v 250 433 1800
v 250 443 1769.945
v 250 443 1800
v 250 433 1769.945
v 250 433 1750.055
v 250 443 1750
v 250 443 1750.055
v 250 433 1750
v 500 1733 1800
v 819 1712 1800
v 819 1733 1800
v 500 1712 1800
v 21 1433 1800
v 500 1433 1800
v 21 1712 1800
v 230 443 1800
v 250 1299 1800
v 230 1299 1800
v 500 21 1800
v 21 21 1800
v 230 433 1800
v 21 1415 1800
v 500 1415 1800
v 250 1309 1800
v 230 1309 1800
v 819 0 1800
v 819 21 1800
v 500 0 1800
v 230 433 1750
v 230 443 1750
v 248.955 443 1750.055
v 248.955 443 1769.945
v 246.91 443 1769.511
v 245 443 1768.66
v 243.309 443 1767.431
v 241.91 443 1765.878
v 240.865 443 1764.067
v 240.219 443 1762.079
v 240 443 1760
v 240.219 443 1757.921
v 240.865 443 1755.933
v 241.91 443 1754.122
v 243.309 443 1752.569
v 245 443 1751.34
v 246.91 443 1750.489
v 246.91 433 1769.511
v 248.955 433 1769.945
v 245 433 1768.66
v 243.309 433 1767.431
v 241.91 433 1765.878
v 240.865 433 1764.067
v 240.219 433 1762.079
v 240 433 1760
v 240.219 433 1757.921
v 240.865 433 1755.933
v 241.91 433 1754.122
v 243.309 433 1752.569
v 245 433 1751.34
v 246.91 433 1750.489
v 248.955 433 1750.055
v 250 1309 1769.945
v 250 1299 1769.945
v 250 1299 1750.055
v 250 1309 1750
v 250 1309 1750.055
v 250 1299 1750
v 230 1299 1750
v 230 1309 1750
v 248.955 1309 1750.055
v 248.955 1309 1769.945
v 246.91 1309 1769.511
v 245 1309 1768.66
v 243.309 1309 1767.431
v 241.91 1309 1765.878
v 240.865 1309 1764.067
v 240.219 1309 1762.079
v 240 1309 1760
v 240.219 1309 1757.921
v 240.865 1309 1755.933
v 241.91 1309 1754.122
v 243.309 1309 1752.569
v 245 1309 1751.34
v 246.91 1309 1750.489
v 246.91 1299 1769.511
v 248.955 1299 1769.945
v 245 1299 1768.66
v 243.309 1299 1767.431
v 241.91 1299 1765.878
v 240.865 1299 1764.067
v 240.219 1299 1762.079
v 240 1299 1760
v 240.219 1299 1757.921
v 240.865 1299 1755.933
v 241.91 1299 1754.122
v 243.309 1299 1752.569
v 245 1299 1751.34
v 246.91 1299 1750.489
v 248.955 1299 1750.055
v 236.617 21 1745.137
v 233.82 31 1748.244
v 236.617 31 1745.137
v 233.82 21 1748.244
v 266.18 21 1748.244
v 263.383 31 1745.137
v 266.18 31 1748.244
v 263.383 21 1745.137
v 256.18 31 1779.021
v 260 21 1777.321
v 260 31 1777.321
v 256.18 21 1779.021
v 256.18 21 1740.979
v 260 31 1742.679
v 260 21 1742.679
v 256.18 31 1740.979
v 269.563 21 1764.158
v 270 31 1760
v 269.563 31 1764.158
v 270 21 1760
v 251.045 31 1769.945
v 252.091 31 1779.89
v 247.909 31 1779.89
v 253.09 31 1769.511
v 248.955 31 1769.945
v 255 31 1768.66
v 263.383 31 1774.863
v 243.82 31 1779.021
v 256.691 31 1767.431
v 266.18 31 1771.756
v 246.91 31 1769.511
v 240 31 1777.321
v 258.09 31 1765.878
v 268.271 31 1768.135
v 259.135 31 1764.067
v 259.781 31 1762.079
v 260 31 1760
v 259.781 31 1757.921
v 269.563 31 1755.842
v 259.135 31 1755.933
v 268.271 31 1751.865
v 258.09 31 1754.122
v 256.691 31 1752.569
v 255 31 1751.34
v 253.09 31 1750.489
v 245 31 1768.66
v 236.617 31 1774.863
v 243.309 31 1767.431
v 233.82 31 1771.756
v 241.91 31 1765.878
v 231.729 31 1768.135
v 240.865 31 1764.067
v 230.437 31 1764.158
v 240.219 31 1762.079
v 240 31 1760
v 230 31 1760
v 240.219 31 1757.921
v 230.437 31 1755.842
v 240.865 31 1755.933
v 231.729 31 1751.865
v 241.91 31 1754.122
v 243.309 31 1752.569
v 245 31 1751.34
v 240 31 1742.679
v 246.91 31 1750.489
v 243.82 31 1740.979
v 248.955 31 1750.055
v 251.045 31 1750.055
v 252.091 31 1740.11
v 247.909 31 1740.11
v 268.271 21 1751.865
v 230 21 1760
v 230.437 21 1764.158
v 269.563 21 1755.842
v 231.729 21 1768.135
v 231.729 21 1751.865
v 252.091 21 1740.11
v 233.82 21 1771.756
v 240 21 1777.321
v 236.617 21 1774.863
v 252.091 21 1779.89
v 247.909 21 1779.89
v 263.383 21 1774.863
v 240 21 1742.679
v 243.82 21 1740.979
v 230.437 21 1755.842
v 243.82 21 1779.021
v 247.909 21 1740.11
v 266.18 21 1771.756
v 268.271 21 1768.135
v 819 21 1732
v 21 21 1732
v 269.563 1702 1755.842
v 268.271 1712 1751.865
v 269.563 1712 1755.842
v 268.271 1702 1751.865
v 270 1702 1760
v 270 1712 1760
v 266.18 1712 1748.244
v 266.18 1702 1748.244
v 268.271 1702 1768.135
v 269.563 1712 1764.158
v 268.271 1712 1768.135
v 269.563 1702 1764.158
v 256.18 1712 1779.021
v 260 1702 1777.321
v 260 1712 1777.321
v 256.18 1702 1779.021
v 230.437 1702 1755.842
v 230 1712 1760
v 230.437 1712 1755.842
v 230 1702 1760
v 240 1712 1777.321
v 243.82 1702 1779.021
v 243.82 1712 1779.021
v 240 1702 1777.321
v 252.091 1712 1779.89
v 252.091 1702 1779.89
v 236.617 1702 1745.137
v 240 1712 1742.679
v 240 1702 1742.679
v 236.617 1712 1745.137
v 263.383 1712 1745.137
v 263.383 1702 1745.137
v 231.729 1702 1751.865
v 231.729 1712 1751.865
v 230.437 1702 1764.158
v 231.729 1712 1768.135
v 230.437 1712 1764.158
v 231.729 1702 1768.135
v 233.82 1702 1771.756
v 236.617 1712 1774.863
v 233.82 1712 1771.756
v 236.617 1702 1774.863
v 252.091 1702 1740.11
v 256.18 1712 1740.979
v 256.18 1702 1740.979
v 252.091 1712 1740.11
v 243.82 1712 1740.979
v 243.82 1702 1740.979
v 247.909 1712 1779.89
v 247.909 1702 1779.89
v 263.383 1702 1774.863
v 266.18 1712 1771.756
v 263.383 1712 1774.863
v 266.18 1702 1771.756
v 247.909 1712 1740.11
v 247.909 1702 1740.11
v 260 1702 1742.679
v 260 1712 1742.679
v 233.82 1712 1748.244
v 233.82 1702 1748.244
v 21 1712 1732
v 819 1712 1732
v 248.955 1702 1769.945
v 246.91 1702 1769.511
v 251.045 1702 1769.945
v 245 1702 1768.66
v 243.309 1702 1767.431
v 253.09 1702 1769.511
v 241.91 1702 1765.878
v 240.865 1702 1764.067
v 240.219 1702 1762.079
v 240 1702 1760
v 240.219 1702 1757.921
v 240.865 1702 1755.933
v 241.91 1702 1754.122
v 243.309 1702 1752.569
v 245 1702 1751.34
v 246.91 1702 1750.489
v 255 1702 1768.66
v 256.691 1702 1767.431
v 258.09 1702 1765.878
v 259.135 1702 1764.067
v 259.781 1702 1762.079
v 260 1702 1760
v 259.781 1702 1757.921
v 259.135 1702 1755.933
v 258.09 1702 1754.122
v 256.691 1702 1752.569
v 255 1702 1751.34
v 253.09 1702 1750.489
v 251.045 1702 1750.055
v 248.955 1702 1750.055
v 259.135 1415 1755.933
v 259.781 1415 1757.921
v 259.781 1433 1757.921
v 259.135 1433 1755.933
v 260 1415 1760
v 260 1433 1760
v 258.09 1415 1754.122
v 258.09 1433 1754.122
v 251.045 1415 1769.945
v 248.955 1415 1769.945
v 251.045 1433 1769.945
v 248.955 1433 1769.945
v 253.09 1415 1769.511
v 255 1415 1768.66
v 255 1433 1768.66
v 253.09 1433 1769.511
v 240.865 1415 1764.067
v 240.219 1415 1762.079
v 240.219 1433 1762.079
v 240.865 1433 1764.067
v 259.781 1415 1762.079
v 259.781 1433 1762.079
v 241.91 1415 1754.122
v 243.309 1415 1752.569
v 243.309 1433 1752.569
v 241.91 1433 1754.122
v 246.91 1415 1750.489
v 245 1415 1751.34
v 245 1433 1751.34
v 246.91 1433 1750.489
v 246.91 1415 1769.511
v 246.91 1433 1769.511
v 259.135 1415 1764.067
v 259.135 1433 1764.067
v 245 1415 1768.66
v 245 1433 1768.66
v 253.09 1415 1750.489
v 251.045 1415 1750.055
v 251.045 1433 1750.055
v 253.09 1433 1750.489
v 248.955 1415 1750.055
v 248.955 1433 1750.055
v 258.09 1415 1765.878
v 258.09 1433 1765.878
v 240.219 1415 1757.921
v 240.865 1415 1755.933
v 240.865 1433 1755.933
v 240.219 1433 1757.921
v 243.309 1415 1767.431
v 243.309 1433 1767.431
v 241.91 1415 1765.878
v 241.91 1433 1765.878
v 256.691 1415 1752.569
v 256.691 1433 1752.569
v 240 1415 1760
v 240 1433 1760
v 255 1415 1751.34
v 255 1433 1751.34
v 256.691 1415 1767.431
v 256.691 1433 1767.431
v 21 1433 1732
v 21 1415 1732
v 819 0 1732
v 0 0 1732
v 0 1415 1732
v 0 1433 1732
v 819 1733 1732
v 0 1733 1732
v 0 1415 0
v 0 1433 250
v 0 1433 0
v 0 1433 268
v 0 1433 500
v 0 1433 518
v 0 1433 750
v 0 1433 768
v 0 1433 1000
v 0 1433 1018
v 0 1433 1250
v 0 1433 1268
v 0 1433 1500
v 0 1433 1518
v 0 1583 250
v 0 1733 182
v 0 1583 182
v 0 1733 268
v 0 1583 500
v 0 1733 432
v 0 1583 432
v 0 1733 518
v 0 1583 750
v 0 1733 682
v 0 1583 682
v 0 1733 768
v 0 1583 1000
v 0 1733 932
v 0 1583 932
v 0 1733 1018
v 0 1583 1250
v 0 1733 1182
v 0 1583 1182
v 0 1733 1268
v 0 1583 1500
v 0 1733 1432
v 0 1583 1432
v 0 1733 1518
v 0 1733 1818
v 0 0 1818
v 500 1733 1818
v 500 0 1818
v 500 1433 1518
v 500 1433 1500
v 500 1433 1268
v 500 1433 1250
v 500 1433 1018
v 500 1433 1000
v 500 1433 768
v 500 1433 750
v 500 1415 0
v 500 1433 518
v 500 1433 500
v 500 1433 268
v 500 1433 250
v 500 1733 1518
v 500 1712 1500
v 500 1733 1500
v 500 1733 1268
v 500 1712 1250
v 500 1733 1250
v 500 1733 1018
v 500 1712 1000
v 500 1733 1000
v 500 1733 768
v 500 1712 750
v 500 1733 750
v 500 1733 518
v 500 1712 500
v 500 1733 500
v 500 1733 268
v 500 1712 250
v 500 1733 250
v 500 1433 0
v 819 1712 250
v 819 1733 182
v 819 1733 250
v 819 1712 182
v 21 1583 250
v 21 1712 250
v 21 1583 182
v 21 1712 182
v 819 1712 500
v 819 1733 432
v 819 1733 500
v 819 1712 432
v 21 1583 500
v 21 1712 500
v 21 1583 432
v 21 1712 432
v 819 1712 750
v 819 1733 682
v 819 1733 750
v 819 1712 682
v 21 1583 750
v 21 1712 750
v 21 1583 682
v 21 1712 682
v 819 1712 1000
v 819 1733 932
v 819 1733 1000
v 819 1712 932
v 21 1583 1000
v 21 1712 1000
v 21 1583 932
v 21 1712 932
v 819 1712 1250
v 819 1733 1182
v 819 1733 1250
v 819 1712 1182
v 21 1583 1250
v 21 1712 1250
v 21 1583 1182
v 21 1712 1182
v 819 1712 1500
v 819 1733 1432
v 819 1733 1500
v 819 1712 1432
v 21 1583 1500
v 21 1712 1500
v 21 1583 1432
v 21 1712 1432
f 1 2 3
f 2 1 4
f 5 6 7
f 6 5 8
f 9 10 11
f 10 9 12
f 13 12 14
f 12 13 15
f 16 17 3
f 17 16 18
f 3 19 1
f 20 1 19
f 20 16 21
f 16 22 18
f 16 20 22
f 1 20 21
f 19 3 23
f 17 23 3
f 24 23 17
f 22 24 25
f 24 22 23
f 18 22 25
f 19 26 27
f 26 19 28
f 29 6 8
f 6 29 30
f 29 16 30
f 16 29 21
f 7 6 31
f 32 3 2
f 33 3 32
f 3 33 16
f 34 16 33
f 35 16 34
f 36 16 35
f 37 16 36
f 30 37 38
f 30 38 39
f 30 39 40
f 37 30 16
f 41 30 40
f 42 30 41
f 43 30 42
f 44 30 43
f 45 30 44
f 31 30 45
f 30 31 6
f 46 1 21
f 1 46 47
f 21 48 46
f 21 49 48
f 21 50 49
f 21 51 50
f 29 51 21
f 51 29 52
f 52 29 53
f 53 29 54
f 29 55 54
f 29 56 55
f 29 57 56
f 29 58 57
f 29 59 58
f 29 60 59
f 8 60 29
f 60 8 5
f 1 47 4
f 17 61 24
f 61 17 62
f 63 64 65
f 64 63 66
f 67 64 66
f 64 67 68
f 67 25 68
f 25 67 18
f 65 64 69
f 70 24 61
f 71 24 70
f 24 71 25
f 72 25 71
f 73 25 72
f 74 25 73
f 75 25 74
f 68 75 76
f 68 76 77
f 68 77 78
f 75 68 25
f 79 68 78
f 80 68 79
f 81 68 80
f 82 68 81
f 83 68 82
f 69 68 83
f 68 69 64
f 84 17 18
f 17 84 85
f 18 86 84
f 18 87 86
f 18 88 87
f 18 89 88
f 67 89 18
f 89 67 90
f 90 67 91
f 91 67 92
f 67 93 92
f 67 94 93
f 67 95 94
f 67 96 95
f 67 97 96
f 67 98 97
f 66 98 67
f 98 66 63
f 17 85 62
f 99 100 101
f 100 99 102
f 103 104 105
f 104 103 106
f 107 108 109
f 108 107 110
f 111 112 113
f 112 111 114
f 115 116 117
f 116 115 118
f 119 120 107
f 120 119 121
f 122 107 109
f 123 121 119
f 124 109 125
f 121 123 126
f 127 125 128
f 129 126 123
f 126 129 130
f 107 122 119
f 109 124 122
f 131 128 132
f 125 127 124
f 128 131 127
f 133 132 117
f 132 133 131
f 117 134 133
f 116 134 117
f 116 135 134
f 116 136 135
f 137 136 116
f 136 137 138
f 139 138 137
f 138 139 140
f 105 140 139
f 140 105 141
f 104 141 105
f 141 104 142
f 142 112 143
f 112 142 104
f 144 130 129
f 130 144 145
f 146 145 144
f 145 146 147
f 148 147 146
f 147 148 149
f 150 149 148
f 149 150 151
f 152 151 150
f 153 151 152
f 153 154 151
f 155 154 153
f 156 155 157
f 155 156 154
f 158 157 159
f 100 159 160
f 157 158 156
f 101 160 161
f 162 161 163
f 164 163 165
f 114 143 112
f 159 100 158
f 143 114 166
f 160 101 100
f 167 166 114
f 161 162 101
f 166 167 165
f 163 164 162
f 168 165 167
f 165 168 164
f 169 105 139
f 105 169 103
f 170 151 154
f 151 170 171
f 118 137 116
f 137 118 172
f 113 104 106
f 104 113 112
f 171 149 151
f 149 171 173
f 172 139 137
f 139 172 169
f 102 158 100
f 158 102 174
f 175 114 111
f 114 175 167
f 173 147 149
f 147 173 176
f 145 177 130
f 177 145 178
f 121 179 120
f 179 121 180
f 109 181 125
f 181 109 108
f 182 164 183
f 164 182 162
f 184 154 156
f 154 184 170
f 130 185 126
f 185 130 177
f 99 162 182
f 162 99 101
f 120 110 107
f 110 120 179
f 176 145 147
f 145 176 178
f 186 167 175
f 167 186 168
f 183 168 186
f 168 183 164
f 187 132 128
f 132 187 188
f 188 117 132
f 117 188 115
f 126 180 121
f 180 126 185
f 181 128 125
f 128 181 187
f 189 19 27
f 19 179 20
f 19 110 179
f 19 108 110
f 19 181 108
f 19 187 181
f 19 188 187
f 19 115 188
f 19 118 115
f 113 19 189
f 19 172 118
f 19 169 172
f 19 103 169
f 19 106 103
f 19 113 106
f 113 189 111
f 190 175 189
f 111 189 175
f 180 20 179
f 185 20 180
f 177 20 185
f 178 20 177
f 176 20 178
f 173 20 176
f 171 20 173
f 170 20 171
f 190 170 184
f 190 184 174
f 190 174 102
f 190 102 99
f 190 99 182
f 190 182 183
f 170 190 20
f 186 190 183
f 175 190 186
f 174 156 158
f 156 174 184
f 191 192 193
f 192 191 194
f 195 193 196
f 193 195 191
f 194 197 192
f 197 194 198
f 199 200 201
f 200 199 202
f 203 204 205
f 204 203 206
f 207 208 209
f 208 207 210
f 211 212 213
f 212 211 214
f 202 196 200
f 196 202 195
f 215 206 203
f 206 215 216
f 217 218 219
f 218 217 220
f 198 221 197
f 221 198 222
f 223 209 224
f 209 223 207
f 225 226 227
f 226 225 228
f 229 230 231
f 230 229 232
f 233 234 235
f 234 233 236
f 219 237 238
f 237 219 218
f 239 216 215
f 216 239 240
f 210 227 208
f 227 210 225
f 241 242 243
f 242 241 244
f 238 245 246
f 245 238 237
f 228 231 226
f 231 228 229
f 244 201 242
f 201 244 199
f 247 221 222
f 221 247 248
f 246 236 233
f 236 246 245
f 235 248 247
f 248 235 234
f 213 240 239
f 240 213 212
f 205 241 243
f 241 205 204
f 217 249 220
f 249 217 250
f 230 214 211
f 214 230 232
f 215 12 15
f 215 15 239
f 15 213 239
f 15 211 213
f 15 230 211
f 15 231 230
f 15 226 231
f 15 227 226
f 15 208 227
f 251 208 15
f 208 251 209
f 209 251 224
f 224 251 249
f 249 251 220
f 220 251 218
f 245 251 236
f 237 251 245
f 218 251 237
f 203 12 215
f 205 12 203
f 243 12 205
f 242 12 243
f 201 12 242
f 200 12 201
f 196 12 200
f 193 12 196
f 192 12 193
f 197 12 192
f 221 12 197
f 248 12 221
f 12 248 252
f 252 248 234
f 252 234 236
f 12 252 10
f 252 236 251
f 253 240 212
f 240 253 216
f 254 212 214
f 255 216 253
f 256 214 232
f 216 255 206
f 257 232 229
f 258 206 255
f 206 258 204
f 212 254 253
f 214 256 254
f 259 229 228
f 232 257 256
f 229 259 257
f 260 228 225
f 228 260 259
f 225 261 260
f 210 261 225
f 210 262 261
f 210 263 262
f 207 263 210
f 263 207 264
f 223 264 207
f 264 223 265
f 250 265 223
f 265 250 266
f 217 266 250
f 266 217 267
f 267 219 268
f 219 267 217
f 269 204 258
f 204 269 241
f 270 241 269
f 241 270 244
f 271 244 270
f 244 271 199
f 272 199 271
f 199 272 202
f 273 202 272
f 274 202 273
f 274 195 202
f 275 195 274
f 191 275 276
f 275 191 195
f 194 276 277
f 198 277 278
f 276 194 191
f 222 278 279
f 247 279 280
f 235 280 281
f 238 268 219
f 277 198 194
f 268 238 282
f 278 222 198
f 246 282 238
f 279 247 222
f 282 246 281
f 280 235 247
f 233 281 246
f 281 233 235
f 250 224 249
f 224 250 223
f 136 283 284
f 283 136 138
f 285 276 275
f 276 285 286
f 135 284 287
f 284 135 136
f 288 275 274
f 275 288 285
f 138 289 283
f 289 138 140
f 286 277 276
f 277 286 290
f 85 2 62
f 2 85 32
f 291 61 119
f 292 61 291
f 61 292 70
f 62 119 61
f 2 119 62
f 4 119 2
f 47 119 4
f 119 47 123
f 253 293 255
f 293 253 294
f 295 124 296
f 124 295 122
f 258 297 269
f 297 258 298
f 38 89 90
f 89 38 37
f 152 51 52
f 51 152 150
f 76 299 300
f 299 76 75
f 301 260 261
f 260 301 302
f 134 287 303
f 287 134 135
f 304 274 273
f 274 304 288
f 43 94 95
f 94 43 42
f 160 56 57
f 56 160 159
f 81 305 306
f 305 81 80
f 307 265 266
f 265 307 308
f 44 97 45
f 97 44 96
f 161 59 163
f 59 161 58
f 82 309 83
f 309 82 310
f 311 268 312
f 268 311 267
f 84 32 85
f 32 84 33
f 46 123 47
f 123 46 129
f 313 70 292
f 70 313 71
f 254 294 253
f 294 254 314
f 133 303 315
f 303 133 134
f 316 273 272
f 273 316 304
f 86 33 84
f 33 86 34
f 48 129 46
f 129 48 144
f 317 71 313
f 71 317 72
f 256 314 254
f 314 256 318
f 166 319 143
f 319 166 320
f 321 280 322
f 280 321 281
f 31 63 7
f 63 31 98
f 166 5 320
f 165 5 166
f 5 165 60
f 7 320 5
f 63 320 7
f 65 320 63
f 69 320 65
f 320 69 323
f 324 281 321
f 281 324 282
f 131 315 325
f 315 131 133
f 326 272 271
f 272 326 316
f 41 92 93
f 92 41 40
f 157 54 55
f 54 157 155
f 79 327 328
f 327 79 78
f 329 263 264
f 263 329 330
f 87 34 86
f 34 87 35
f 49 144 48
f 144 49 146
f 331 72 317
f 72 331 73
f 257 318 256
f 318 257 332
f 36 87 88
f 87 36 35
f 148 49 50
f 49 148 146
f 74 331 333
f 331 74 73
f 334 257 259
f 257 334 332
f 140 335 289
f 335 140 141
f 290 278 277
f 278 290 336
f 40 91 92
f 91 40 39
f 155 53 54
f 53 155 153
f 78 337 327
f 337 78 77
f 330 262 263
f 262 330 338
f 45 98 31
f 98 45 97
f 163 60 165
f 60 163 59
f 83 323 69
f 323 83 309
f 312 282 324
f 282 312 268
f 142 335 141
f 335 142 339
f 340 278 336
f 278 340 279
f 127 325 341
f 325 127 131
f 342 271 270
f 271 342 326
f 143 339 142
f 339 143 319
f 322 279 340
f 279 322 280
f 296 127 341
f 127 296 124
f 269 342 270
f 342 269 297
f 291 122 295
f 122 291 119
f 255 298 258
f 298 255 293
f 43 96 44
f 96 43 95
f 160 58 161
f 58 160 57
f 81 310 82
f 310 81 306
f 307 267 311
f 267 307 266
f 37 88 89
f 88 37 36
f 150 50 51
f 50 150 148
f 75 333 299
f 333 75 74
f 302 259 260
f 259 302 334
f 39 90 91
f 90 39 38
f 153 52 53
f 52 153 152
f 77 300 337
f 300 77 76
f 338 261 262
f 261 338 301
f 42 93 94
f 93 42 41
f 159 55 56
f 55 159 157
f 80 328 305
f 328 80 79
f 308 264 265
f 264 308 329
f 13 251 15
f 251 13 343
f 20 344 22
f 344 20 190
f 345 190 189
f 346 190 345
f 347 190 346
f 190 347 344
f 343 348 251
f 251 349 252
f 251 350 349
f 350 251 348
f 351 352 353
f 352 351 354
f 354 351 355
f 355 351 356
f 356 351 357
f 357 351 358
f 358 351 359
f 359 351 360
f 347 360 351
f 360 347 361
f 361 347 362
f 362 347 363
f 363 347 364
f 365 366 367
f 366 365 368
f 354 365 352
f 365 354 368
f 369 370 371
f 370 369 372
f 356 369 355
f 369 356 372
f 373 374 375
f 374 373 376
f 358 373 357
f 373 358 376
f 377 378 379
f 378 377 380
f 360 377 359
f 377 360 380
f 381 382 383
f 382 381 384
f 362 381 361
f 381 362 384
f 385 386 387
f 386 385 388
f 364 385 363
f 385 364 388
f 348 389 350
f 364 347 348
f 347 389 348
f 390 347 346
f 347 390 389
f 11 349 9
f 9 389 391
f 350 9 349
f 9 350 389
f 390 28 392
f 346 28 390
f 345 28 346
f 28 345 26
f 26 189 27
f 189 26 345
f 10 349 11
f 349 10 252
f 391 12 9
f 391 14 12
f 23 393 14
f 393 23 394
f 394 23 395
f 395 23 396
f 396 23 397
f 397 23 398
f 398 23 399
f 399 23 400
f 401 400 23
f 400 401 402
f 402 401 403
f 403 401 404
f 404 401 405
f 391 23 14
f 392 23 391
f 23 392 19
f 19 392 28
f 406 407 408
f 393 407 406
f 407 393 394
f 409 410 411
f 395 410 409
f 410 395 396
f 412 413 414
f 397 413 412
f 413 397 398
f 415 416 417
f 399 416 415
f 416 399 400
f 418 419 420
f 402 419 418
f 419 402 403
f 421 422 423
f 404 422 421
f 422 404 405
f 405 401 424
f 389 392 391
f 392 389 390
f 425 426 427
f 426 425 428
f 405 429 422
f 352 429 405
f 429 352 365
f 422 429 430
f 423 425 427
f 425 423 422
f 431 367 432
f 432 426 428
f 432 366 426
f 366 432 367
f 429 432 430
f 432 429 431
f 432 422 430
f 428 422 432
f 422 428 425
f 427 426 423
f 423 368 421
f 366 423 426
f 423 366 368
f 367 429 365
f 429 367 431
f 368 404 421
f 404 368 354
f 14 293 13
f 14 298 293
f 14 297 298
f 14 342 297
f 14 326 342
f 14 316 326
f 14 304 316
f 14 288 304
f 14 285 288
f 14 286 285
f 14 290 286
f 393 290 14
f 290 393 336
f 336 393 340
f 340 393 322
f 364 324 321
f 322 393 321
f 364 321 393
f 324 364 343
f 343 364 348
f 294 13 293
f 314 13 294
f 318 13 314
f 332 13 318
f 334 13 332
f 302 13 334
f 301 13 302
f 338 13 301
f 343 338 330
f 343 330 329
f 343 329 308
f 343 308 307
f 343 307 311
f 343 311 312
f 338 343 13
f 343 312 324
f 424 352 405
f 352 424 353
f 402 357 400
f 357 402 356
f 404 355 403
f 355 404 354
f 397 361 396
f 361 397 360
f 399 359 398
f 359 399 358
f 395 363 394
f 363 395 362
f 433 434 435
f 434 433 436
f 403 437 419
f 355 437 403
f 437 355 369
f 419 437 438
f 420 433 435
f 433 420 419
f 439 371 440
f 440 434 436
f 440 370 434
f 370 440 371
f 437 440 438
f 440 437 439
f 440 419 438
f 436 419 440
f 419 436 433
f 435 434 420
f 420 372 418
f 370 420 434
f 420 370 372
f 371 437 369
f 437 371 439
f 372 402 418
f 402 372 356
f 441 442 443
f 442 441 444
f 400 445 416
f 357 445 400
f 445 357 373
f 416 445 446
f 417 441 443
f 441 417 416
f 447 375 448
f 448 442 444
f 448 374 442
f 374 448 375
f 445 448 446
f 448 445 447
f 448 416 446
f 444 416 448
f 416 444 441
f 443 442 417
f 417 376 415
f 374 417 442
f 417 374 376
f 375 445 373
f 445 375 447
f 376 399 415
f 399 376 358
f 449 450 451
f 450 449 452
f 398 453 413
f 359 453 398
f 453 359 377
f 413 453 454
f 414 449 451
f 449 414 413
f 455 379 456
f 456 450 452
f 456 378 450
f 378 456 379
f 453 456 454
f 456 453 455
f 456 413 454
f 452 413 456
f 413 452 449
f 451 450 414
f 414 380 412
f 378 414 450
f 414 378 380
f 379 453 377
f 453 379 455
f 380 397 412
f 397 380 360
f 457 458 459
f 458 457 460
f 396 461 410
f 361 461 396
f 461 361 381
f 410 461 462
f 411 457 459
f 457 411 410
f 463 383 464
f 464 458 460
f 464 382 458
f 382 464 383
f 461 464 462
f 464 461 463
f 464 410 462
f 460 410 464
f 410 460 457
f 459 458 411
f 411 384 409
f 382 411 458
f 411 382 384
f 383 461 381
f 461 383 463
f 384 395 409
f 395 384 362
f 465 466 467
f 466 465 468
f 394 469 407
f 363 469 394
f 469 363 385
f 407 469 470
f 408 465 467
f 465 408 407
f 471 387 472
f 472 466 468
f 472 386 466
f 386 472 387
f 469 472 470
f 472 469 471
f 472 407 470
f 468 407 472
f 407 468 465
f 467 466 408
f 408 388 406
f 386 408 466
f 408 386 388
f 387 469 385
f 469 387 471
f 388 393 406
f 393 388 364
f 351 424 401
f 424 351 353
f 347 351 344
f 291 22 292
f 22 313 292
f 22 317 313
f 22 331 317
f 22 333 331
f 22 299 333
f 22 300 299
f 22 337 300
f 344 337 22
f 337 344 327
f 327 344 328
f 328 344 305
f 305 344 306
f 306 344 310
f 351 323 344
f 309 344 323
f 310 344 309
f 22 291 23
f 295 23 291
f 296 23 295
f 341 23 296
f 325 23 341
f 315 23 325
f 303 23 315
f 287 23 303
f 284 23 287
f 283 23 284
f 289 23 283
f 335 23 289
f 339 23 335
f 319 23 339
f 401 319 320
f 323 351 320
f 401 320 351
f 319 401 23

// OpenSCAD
// file: lib/wardrobe.scad
// Bedroom Wardrobe CAD
// Tips/lessons:
// - Build modules relative to 0,0,0, then translate into place later.
// - Dimensions are measured length (across), width (away), height (up).
// - This matches to y, x, z here.
// - Dimensions are also relative, so no necessarily x, y, z.
// - Use functions to represent dimensions

// Wardrobe dimensions
function wd_length() = 1733; // Y
function wd_width() = 0819; // X
function wd_height() = 2398; // Z

// Skirting dimensions
function wd_skirting_width() = 16;
function wd_skirting_height() = 145;

// Shelf dimensions
// Cut length to size.
function wd_shelf_height() = 18;
function wd_shelf_width() = 500;

// Batten dimensions
// Battens hold up shelves, cut height to size, and translate into place
// Notes: length and width of batton doesn't map directly to xyz
function wd_batten_large_length() = 68;
function wd_batten_large_width() = 21;

// Clothes rail dimensions
function wd_rail_radius() = 10;
function wd_rail_z() = -40;

module wd_wall_with_door() {
	door_length = 1381;
	door_height = 2000;
	border_length = (wd_length() - door_length) / 2;
	difference() {
		// border
		square([wd_height(), wd_length()]);
		// opening
		translate([0, border_length, 0])
			square([door_height, door_length]);
	}
}

module wd_skirting_rear() {
	cube([wd_skirting_width(), wd_length(), wd_skirting_height()]);
}

module wd_skirting_side() {
	cube([wd_width(), wd_skirting_width(), wd_skirting_height()]);
}

// Walls, guidance only 2D shapes
module wd_walls() {
	// base
	square([wd_width(), wd_length()]);
	// rear
	rotate(-90, [0, 1, 0])
		square([wd_height(), wd_length()]);
	// door
	translate([wd_width(), 0, 0])
		rotate(-90, [0, 1, 0])
		wd_wall_with_door();

	wd_skirting_rear();
	wd_skirting_side();
	translate([0, wd_length()-wd_skirting_width(), 0])
		wd_skirting_side();
}

module _crail_support(shelf_width, y) {
	h = 50;
	w = 20;
	l = 10;
	translate([shelf_width / 2 - w, y, 0 - h])
		cube([w, l, h]);
}

// Clothes rail full length, underneath shelf_height, centred on shelf_width.
module wd_crail_full(shelf_width) {
	// rail ends screw into the battens
	rail_end_radius = 20;
	rail_end_height = 10;
	rail_end_y = [wd_batten_large_width(),
		wd_length()-wd_batten_large_width()-rail_end_height];

	// rail supports suspend from the shelf
	rail_supports_y = [433, 1299];

	// Height of the pole if it were standing up
	rail_height = wd_length() - wd_batten_large_width() * 2;

	// Positioned half way under shelf_width and suspended z mm
	rail_x = shelf_width / 2;

	// rail
	translate([rail_x, wd_batten_large_width(), wd_rail_z()])
		rotate(-90, [1, 0, 0])
		cylinder(rail_height, wd_rail_radius(), wd_rail_radius());
	
	// supports
	for (i = rail_supports_y) {
		_crail_support(shelf_width, i);
	}
	for (i = rail_end_y) {
		translate([rail_x, i, wd_rail_z()])
			rotate(-90, [1, 0, 0])
			cylinder(rail_end_height, rail_end_radius,
				rail_end_radius);
	}
}

// Batten on the rear wall
module wd_batten_rear_large(length=wd_length()) {
	translate([0, 0, 0-wd_batten_large_length()])
	    cube([wd_batten_large_width(), length, wd_batten_large_length()]);
}

module wd_batten_side_large() {
	batten_rear_width = wd_batten_large_width();
	length = wd_batten_large_width();
	width = wd_width() - wd_batten_large_width();
	height = wd_batten_large_length();
	translate([batten_rear_width, 0, 0-wd_batten_large_length()])
		cube([width, length, height]);
}

// Create a full sized shelf
module wd_shelf_full(rail=false) {
	// Battens
	wd_batten_rear_large();
	wd_batten_side_large();
	translate([0, wd_length()-wd_batten_large_width(), 0])
		wd_batten_side_large();

	// Shelf
	cube([wd_shelf_width(), wd_length(), wd_shelf_height()]);

	if (rail) {
		wd_crail_full(wd_shelf_width());
	}
}

// Wardrobe divider wall
// Set cutout to true to cut out rail, batten, skirting holes
module wd_div_wall(height, cutout=false) {
	if (cutout) {
		difference() {
			cube([wd_shelf_width(), wd_shelf_height(), height]);
			// Cutout for rail
			// Note: When you build this, drill a nice hole
			c_rail_x = wd_shelf_width() / 2 - wd_rail_radius();
			c_rail_height = abs(wd_rail_z()) + wd_rail_radius();
			translate([c_rail_x, 0, height])
				mirror([0, 0, 1])
				cube([wd_rail_radius() * 2,
					wd_shelf_height(),
					c_rail_height]);
			// batten
			translate([0, 0, height])
				mirror([0, 0, 1])
				cube([wd_batten_large_width(),
					wd_shelf_height(),
					wd_batten_large_length()]);
			// skirting
			cube([wd_skirting_width(),
				wd_shelf_height(),
				wd_skirting_height()]);
		}
	} else {
		cube([wd_shelf_width(), wd_shelf_height(), height]);
	}
}

function wd_shelf_left_length_default() = 
	wd_length() / 2 - wd_shelf_height() / 2;

module wd_shelf_left(length=wd_shelf_left_length_default()) {
	wd_batten_side_large();
	wd_batten_rear_large(length / 2);
	cube([wd_shelf_width(), length, wd_shelf_height()]);
}

module wd_shelf_right(length=wd_shelf_left_length_default()) {
	translate([0, wd_length(), 0])
	mirror([0, 1, 0])
		wd_shelf_left(length);
}
// main file
// Middle full-height, left and right shelves
use <lib/wardrobe.scad>

function shelf_top_z() = 1800;
function div_wall_y() = 300;

% wd_walls();
translate([0, 0, shelf_top_z()])
	wd_shelf_full(rail=true);

// Left divider
//translate([0, div_wall_y(), 0])
//	wd_div_wall(shelf_top_z());
// Right divider
translate([0, wd_length(), 0])
	mirror([0, 1, 0])
	translate([0, div_wall_y(), 0])
	wd_div_wall(shelf_top_z());

// Leave 1100mm (min 1000mm) to hang Tom's clothes
for (i = [250, 500, 750, 1000, 1250, 1500]) {
	translate([0, 0, i]) {
		//wd_shelf_left(div_wall_y());
		wd_shelf_right(div_wall_y());
	}
}
